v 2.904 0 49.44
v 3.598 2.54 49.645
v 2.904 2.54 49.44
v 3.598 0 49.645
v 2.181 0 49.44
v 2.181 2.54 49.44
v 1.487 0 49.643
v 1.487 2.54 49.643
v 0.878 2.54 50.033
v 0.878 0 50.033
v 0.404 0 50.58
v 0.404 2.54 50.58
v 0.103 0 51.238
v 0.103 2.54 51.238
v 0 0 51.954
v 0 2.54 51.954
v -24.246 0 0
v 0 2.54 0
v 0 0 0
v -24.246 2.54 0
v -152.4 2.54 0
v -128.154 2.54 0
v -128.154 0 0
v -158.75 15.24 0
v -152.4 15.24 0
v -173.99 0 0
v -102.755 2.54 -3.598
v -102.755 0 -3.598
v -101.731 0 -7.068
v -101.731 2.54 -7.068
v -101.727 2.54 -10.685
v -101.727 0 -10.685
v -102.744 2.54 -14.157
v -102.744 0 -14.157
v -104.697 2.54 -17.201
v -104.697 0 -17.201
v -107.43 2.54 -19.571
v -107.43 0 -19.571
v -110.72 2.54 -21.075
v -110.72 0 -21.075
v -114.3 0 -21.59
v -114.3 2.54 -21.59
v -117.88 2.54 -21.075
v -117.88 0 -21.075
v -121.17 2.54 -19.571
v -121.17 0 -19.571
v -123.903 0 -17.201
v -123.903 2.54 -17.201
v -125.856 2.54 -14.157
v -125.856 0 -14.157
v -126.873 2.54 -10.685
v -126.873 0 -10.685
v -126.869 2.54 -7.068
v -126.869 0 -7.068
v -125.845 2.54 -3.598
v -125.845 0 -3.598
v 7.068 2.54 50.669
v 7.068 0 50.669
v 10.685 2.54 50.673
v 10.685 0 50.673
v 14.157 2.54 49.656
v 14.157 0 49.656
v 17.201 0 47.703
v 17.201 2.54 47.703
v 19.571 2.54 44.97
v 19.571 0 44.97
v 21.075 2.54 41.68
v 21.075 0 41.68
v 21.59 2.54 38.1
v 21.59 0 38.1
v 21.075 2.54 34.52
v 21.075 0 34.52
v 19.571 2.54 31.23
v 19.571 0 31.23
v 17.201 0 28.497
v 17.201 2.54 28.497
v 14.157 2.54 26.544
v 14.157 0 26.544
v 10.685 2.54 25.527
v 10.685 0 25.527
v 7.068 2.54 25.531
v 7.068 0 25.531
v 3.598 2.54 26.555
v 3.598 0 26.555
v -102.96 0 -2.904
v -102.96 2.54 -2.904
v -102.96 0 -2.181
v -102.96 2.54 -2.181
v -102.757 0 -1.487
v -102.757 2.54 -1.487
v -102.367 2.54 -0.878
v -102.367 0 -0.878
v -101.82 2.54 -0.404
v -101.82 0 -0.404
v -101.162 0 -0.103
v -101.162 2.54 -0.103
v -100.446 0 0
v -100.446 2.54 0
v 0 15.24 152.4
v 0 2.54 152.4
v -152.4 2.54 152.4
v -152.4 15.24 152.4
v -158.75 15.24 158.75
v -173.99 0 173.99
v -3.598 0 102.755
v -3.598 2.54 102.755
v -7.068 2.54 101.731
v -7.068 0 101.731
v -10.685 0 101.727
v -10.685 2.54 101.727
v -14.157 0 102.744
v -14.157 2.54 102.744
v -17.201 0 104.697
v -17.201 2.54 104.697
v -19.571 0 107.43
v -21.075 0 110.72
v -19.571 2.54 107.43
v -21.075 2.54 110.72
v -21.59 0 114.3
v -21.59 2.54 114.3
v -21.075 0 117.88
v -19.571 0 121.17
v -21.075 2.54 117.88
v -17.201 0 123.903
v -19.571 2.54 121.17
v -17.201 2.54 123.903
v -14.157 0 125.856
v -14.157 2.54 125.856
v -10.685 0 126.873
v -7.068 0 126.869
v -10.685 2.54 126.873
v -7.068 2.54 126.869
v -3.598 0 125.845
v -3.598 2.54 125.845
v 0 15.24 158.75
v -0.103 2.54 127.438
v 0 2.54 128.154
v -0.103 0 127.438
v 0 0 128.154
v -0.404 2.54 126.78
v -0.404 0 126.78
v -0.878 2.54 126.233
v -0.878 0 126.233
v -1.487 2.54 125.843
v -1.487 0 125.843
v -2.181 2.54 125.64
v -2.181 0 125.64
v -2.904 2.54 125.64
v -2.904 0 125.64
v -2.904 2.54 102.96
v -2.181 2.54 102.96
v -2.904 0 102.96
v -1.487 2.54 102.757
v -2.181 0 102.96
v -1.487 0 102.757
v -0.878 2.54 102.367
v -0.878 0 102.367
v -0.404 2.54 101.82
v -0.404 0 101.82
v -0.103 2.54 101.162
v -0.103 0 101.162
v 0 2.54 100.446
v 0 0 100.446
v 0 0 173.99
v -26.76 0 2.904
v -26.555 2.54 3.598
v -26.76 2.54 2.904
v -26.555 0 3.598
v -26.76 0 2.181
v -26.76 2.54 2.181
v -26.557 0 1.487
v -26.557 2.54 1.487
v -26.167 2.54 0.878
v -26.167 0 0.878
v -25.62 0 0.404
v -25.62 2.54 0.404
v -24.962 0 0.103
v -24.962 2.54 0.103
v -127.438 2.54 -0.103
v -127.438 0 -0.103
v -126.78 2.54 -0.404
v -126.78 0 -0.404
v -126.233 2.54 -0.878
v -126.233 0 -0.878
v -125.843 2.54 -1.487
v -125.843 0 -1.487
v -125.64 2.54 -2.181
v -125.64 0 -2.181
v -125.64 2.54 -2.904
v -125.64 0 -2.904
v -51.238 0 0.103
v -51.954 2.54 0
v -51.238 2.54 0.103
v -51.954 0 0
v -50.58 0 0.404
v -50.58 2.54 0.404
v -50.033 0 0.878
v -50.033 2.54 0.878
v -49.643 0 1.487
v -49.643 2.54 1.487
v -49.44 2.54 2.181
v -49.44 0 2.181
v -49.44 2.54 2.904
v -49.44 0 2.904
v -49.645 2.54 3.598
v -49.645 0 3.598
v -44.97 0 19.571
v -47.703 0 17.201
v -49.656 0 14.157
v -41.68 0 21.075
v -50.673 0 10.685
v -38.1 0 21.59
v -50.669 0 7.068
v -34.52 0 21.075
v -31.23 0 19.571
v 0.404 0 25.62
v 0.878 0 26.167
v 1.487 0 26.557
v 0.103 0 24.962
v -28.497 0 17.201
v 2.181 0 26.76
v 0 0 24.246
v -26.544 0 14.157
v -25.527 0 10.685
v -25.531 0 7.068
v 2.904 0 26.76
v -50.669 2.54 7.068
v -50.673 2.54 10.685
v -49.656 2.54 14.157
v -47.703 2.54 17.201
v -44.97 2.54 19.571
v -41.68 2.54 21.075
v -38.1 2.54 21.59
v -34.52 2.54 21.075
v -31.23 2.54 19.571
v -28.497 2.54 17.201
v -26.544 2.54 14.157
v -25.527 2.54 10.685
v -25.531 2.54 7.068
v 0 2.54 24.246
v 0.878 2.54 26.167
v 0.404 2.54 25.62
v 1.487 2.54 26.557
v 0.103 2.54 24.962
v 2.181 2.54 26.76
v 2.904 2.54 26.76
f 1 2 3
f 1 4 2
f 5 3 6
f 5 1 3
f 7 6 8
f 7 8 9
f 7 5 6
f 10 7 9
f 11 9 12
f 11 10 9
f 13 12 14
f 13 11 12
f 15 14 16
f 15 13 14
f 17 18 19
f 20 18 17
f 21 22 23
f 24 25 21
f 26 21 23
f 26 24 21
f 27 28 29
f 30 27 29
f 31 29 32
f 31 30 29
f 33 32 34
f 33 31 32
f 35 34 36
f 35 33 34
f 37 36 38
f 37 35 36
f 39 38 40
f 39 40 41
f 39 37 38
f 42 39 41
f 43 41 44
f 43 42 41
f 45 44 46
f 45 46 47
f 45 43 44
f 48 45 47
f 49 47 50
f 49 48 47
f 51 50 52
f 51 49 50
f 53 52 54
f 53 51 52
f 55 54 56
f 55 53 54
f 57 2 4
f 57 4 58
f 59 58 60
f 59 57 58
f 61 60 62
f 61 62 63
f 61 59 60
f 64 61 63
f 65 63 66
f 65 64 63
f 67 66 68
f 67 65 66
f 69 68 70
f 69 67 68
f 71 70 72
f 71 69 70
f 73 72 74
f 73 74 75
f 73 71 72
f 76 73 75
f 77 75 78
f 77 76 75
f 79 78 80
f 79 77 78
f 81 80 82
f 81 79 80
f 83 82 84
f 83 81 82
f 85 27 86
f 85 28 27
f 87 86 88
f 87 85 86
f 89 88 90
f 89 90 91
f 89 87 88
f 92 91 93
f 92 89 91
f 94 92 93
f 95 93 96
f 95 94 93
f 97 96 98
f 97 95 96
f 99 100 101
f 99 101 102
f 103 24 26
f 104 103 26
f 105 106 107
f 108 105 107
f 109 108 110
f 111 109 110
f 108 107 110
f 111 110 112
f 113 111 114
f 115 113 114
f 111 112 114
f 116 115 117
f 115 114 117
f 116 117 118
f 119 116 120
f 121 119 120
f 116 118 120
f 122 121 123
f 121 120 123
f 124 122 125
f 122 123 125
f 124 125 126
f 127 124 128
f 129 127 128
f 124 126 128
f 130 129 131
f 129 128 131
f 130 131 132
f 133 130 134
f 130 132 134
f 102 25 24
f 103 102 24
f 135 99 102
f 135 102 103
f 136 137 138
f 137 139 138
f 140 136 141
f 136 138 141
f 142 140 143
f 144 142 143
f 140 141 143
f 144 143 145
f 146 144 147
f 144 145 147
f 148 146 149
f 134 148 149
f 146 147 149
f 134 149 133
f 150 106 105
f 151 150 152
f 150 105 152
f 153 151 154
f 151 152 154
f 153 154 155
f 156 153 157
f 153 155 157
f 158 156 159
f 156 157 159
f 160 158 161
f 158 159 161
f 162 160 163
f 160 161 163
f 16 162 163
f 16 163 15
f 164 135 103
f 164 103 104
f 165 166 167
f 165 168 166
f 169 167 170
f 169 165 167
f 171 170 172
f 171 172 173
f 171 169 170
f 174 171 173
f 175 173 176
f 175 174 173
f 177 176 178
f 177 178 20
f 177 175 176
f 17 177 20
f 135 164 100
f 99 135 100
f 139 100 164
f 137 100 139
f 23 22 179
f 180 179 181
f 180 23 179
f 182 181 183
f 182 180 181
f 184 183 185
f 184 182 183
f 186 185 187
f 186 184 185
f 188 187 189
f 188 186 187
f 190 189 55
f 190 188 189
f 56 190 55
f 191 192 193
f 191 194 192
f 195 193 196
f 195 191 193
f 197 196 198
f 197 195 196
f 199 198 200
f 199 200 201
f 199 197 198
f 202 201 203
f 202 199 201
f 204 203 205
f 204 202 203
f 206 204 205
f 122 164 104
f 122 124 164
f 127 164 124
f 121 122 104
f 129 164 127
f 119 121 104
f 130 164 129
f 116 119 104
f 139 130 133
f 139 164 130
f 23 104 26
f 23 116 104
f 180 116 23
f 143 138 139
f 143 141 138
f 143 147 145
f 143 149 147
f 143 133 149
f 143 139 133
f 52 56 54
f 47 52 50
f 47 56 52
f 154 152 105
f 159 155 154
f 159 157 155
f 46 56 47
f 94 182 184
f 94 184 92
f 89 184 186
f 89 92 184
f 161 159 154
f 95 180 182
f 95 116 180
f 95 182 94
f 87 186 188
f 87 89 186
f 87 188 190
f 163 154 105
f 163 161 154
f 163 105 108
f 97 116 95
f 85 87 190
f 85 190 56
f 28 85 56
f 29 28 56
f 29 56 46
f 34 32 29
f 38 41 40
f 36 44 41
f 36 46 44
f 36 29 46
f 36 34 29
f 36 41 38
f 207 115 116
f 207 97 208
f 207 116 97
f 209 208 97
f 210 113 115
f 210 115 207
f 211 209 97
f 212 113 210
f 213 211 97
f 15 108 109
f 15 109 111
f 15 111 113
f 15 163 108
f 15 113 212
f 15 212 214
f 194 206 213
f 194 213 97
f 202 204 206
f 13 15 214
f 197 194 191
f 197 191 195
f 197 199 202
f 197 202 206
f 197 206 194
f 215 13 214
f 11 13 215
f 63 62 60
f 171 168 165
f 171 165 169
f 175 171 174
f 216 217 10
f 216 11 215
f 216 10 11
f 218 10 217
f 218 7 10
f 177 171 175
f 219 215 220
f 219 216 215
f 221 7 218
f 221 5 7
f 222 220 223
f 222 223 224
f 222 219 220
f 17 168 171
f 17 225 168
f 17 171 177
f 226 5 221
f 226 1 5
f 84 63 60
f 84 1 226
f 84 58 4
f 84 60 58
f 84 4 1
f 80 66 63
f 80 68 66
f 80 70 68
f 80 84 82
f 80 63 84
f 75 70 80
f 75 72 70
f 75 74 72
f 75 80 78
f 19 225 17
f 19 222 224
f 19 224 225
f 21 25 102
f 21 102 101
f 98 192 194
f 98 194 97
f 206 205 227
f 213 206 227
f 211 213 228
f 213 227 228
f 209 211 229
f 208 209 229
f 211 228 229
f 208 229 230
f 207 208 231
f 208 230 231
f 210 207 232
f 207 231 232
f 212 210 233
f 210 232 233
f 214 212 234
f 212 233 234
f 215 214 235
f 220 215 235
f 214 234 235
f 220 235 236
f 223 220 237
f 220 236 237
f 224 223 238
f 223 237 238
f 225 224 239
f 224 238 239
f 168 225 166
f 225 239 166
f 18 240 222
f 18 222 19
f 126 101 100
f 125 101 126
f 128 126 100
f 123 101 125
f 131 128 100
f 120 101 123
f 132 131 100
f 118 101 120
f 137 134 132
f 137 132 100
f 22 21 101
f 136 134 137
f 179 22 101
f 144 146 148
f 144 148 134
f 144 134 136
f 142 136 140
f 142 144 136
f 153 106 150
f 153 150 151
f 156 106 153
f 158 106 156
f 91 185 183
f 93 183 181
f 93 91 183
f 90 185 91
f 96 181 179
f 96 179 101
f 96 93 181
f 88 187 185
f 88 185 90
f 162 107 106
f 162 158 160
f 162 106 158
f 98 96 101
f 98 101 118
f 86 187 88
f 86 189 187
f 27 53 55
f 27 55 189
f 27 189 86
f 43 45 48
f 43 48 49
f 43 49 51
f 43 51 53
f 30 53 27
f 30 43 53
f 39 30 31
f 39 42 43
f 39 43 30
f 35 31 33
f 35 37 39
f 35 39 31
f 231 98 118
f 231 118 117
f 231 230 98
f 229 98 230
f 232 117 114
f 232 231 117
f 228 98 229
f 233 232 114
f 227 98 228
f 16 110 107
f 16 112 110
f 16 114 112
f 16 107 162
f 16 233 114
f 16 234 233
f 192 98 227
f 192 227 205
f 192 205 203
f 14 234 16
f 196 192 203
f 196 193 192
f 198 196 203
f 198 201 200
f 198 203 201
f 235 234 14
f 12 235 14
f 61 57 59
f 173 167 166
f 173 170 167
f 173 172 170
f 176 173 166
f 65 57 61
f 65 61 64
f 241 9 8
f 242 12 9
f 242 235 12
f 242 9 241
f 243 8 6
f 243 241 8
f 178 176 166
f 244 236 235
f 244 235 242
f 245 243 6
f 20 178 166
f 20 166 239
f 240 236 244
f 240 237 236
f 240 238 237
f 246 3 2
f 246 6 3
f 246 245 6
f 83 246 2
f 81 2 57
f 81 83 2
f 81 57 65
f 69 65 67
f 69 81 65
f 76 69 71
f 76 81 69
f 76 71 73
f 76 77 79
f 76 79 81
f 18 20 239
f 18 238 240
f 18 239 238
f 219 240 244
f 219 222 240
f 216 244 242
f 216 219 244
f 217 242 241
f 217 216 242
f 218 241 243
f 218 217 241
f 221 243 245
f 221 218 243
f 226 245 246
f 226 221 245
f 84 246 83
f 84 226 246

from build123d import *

# Parameters (mm, degrees)
BOSS_EXTRUDE1_DEPTH = 152.4
BOSS_EXTRUDE2_DEPTH = 173.99
CUT_EXTRUDE1_DEPTH  = 232.798485112
BOSS_EXTRUDE3_DEPTH = 2.54
CUT_EXTRUDE2_DEPTH  = 247.386546305
FILLET1_R           = 2.54


with BuildPart() as part:
    # Sketch1 → Boss-Extrude1 (new body)
    with BuildSketch(Plane.XY):
        Polygon((0, 0), (-173.99, 0), (-158.75, 15.24), (-152.4, 15.24), (-152.4, 2.54), (0, 2.54), align=None)
    extrude(amount=BOSS_EXTRUDE1_DEPTH)

    # Sketch2 → Boss-Extrude2 (add, through all)
    with BuildSketch(Plane(origin=(0, 0, 0), x_dir=(0, 0, -1), z_dir=(1, 0, 0))):
        Polygon((-152.4, 2.54), (-152.4, 15.24), (-158.75, 15.24), (-173.99, 0), (-152.4, 0), align=None)
    extrude(amount=-BOSS_EXTRUDE2_DEPTH)

    # Sketch3 → Cut-Extrude1 (cut, through all)
    with BuildSketch(Plane(origin=(0, 0, 152.4), x_dir=(-1, 0, 0), z_dir=(0, 0, -1))):
        Polygon((158.75, 15.24), (173.99, 0), (173.99, 15.24), align=None)
    extrude(amount=-CUT_EXTRUDE1_DEPTH, mode=Mode.SUBTRACT)

    # Sketch4 → Boss-Extrude3 (add, through all)
    with BuildSketch(Plane(origin=(0, 2.54, 0), x_dir=(1, 0, 0), z_dir=(0, 1, 0))):
        with BuildLine():
            ThreePointArc((-105.230385896, 0), (-114.3, 21.59), (-123.369614104, 0))
            Line((-123.369614104, 0), (-105.230385896, 0))
        make_face()
        with BuildLine():
            ThreePointArc((0, -47.169614104), (21.59, -38.1), (0, -29.030385896))
            Line((0, -29.030385896), (0, -47.169614104))
        make_face()
    extrude(amount=-BOSS_EXTRUDE3_DEPTH)

    # Sketch4<3> → Cut-Extrude2 (cut, through all)
    with BuildSketch(Plane(origin=(0, 2.54, 0), x_dir=(1, 0, 0), z_dir=(0, 1, 0))):
        with BuildLine():
            Line((-29.030385896, 0), (-47.169614104, 0))
            ThreePointArc((-47.169614104, 0), (-38.1, -21.59), (-29.030385896, 0))
        make_face()
        with BuildLine():
            Line((0, -123.369614104), (0, -105.230385896))
            ThreePointArc((0, -105.230385896), (-21.59, -114.3), (0, -123.369614104))
        make_face()
    extrude(amount=-CUT_EXTRUDE2_DEPTH, mode=Mode.SUBTRACT)

    # Fillet1
    fillet1_edges = [part.edges().sort_by_distance(p)[0] for p in [
        (-123.369614104, 1.27, 0),
        (-105.230385896, 1.27, 0),
        (0, 1.27, 29.030385896),
        (0, 1.27, 47.169614104),
        (-47.169614104, 1.27, 0),
        (-29.030385896, 1.27, 0),
        (0, 1.27, 105.230385896),
        (0, 1.27, 123.369614104),
    ]]
    fillet(fillet1_edges, radius=FILLET1_R)


solid = part.part
